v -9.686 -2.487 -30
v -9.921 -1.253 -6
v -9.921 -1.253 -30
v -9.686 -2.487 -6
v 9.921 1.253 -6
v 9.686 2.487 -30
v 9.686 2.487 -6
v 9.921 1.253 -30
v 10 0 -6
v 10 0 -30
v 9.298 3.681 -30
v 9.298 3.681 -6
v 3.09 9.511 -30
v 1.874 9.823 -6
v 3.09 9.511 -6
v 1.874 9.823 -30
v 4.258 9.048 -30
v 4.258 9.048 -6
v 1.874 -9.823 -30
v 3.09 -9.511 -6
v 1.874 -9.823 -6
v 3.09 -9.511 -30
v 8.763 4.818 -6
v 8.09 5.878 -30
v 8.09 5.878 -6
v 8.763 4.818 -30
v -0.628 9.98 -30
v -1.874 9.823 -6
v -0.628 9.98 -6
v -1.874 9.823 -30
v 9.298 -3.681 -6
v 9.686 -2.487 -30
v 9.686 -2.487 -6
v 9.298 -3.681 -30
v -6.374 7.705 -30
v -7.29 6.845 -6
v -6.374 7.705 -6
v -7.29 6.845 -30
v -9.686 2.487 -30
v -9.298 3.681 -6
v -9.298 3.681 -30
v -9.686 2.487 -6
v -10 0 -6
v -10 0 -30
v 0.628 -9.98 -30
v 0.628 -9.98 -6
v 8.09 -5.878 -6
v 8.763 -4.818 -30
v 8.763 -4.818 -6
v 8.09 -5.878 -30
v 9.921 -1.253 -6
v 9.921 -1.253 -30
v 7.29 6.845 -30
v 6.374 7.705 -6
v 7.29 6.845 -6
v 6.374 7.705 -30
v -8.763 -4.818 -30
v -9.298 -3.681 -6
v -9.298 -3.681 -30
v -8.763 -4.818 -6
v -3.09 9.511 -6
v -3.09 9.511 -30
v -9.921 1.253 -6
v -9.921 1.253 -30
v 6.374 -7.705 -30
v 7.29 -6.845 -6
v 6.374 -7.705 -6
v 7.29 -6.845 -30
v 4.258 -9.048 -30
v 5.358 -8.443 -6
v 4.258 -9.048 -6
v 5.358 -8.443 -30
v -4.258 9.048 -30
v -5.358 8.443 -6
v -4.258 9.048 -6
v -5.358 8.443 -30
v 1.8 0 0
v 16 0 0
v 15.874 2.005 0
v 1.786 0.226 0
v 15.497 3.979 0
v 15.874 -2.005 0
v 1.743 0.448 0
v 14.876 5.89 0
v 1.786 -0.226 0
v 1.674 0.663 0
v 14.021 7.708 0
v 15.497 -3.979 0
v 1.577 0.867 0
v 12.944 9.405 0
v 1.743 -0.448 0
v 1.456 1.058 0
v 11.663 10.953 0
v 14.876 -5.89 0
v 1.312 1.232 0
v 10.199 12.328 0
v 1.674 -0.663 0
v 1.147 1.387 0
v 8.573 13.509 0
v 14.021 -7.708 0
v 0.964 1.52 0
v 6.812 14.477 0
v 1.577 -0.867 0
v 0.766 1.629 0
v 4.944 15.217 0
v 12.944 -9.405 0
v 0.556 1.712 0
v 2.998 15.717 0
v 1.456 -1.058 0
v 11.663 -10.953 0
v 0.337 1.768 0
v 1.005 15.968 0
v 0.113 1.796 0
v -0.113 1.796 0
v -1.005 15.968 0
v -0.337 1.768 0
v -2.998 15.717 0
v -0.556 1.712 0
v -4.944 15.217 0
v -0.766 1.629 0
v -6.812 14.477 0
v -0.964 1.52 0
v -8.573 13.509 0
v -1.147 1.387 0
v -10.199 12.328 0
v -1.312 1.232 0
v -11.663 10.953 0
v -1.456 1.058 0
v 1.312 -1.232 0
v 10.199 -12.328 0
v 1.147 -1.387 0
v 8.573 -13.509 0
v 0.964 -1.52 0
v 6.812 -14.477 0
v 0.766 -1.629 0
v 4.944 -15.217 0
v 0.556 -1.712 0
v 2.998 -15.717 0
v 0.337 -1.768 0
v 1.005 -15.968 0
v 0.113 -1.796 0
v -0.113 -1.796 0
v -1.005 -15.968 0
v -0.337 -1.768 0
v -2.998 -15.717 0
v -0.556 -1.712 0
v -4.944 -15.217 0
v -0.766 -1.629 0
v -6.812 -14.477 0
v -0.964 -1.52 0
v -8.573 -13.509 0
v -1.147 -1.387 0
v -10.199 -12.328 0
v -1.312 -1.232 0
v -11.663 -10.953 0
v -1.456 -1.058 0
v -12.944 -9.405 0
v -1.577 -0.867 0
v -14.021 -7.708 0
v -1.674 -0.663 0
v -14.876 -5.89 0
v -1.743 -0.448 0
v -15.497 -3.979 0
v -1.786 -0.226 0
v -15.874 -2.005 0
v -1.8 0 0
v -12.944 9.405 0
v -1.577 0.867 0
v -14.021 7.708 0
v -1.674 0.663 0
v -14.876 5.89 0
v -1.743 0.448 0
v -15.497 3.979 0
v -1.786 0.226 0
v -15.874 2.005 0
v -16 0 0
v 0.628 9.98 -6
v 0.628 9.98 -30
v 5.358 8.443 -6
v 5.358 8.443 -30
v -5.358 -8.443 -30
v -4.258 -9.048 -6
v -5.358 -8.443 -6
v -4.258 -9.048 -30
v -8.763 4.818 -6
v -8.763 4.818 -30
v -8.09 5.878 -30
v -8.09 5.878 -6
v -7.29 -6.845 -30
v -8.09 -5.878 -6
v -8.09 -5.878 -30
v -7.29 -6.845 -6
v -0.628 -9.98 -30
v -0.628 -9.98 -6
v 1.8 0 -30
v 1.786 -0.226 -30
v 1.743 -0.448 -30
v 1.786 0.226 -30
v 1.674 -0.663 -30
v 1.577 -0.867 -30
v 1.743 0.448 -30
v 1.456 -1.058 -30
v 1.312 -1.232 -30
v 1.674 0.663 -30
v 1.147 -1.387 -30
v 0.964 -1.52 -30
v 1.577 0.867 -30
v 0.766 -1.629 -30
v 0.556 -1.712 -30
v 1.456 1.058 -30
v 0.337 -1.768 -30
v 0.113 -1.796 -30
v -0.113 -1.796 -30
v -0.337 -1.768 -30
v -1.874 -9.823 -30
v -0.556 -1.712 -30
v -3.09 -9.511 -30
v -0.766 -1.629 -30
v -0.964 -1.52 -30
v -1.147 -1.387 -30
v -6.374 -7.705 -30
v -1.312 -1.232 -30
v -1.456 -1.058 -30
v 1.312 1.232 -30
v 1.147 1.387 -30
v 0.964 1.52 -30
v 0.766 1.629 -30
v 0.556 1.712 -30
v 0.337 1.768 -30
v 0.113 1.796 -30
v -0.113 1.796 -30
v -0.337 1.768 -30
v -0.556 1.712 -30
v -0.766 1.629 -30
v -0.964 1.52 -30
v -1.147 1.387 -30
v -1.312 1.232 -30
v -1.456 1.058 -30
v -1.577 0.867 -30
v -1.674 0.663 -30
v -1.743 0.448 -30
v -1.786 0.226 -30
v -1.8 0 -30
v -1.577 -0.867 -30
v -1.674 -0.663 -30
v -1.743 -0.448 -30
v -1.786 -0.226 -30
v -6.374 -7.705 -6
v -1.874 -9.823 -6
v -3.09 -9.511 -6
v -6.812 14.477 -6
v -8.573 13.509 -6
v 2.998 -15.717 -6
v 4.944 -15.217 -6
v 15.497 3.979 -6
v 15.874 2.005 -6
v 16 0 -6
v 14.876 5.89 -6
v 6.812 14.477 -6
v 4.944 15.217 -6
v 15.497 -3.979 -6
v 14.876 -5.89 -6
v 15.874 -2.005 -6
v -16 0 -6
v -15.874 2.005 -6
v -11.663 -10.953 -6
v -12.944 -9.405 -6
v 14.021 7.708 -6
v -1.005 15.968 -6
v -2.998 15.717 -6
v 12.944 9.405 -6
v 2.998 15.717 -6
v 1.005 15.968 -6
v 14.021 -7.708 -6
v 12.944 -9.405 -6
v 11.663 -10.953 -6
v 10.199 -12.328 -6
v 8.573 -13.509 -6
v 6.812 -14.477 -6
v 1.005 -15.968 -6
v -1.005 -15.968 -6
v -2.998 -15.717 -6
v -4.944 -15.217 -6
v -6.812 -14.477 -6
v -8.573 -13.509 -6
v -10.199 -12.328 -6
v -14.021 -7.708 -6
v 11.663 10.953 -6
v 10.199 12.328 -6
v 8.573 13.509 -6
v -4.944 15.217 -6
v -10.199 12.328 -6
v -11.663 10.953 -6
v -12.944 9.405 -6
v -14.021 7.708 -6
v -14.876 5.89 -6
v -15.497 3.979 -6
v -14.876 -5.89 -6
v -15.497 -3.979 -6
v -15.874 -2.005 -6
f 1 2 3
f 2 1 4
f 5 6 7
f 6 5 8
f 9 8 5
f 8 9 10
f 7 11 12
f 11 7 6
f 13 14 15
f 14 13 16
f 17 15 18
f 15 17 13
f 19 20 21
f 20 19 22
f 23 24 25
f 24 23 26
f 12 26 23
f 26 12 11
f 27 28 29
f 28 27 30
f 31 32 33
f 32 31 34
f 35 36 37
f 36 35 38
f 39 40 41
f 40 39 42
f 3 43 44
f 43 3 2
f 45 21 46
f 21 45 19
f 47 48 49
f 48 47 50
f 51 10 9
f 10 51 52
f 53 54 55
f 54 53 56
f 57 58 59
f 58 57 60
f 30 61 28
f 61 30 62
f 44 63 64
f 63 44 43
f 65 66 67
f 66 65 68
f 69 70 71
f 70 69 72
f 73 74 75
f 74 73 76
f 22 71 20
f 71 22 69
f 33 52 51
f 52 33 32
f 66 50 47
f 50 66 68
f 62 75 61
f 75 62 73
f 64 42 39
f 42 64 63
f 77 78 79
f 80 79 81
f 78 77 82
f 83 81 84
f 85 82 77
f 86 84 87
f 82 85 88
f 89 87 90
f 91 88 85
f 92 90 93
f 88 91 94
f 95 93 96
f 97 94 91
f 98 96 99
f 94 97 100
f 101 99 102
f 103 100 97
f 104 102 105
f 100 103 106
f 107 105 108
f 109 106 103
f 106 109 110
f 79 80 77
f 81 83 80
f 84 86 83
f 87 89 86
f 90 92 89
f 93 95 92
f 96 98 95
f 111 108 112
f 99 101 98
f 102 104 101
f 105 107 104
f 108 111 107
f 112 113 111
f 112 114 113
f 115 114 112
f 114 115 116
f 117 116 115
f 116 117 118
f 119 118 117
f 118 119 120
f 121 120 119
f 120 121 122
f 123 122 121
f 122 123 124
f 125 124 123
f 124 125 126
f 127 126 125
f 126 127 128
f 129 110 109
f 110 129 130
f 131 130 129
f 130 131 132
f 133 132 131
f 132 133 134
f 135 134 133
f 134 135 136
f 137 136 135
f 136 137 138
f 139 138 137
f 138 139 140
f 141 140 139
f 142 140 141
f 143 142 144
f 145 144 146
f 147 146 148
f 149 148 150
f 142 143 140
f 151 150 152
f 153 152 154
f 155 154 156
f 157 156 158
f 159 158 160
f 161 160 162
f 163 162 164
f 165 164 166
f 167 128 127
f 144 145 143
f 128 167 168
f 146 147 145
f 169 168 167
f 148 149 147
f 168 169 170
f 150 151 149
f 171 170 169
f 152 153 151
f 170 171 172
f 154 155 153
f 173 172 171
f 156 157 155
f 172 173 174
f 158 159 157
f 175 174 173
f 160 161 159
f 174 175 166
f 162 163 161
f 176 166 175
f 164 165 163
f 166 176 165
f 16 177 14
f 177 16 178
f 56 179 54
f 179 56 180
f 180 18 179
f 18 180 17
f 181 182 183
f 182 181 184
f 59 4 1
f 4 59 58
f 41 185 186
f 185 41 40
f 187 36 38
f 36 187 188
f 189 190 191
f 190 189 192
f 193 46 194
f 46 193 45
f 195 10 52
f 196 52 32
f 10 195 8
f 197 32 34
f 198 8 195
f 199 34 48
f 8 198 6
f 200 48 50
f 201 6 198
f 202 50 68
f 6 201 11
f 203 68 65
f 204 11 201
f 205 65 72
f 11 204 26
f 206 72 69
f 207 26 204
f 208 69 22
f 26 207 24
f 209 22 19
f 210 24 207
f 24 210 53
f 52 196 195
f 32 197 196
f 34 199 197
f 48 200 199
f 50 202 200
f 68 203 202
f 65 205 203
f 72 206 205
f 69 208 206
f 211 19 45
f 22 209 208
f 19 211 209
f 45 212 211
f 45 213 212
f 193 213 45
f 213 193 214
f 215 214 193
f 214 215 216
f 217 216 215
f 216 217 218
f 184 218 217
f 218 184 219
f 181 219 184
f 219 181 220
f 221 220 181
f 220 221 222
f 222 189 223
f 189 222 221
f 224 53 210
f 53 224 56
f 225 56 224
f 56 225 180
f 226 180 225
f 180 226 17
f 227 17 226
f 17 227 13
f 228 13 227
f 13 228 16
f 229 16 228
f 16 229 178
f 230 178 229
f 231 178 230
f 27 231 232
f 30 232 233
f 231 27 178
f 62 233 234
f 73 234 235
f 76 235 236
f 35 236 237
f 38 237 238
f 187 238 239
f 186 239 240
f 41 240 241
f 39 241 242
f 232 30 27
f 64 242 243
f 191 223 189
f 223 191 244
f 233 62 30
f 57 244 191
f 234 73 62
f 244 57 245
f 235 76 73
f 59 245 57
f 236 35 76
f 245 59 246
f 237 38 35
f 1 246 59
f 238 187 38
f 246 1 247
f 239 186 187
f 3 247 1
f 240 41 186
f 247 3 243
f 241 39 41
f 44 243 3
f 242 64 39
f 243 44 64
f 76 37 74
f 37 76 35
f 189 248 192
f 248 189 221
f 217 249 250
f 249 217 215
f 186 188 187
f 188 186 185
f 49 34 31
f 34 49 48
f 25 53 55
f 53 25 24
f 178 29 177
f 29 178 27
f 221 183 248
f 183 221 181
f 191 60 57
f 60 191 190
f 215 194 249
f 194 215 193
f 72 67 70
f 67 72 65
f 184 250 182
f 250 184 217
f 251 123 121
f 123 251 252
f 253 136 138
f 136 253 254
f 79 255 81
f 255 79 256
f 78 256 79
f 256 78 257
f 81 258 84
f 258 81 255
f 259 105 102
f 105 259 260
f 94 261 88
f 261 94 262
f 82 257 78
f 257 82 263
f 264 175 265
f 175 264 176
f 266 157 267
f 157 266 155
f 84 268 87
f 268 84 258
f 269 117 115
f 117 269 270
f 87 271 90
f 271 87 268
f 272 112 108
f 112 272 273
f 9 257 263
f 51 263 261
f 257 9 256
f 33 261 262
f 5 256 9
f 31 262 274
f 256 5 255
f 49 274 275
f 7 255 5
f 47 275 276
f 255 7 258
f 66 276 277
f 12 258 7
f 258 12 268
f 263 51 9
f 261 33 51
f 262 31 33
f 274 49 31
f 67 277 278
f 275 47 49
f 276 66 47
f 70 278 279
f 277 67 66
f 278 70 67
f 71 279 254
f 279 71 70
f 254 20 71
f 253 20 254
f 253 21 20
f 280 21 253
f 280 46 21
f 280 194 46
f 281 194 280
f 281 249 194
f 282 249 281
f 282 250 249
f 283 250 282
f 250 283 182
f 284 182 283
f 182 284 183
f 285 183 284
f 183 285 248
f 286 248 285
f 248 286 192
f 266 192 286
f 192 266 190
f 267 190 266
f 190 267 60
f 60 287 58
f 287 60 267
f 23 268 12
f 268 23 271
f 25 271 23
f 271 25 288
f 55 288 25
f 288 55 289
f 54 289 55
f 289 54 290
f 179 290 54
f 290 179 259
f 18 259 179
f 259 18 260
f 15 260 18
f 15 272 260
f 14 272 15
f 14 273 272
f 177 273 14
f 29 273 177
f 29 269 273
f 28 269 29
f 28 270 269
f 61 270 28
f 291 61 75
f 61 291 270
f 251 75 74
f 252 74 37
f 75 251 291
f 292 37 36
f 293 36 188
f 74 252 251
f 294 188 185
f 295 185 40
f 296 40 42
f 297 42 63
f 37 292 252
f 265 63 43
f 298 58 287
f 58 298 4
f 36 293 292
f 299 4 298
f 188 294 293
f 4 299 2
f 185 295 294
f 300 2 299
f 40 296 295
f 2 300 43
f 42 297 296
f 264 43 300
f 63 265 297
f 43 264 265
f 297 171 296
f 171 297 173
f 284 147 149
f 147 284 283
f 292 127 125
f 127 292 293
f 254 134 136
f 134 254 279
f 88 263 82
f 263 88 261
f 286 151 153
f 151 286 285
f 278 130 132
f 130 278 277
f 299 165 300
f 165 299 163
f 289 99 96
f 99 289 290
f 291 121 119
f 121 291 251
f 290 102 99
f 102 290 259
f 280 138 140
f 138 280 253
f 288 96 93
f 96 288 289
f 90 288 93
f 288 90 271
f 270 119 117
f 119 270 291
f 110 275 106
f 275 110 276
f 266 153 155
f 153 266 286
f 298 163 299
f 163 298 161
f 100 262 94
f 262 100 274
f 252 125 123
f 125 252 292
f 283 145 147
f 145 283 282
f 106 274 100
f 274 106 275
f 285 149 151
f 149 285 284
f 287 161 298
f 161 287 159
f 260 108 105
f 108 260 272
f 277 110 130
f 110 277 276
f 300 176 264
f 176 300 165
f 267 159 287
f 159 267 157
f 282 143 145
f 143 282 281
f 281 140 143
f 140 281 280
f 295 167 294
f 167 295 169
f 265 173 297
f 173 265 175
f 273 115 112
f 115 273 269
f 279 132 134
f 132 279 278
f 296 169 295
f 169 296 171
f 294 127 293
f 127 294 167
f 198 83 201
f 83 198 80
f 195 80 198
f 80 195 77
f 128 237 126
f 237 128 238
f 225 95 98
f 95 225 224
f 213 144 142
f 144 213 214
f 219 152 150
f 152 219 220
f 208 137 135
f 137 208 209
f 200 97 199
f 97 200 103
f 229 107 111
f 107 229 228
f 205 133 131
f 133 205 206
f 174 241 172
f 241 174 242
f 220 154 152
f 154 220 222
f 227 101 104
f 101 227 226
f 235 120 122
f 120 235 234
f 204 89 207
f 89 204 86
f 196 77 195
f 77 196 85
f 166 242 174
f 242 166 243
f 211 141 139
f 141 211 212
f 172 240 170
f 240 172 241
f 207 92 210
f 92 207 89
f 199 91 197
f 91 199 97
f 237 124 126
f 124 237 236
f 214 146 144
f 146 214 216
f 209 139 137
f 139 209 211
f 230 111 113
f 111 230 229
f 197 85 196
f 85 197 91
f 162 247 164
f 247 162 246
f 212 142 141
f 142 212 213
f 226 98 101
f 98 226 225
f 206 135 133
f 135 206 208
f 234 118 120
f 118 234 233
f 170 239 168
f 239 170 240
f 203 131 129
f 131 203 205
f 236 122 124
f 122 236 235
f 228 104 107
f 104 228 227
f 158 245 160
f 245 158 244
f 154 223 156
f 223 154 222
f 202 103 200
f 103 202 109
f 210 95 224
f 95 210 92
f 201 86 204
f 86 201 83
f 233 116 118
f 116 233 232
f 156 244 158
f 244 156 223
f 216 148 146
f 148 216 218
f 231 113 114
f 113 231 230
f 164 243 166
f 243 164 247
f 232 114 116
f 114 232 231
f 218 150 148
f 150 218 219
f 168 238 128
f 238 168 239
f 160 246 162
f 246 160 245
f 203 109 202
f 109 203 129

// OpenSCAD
$fn = 50;


difference() {
	union() {
		translate(v = [0, 0, -30.0000000000]) {
			cylinder(h = 30, r = 10.0000000000);
		}
		translate(v = [0, 0, -6.0000000000]) {
			cylinder(h = 6, r = 16.0000000000);
		}
	}
	union() {
		#translate(v = [0, 0, -30]) {
			cylinder(h = 30, r = 1.8000000000);
		}
	}
}
